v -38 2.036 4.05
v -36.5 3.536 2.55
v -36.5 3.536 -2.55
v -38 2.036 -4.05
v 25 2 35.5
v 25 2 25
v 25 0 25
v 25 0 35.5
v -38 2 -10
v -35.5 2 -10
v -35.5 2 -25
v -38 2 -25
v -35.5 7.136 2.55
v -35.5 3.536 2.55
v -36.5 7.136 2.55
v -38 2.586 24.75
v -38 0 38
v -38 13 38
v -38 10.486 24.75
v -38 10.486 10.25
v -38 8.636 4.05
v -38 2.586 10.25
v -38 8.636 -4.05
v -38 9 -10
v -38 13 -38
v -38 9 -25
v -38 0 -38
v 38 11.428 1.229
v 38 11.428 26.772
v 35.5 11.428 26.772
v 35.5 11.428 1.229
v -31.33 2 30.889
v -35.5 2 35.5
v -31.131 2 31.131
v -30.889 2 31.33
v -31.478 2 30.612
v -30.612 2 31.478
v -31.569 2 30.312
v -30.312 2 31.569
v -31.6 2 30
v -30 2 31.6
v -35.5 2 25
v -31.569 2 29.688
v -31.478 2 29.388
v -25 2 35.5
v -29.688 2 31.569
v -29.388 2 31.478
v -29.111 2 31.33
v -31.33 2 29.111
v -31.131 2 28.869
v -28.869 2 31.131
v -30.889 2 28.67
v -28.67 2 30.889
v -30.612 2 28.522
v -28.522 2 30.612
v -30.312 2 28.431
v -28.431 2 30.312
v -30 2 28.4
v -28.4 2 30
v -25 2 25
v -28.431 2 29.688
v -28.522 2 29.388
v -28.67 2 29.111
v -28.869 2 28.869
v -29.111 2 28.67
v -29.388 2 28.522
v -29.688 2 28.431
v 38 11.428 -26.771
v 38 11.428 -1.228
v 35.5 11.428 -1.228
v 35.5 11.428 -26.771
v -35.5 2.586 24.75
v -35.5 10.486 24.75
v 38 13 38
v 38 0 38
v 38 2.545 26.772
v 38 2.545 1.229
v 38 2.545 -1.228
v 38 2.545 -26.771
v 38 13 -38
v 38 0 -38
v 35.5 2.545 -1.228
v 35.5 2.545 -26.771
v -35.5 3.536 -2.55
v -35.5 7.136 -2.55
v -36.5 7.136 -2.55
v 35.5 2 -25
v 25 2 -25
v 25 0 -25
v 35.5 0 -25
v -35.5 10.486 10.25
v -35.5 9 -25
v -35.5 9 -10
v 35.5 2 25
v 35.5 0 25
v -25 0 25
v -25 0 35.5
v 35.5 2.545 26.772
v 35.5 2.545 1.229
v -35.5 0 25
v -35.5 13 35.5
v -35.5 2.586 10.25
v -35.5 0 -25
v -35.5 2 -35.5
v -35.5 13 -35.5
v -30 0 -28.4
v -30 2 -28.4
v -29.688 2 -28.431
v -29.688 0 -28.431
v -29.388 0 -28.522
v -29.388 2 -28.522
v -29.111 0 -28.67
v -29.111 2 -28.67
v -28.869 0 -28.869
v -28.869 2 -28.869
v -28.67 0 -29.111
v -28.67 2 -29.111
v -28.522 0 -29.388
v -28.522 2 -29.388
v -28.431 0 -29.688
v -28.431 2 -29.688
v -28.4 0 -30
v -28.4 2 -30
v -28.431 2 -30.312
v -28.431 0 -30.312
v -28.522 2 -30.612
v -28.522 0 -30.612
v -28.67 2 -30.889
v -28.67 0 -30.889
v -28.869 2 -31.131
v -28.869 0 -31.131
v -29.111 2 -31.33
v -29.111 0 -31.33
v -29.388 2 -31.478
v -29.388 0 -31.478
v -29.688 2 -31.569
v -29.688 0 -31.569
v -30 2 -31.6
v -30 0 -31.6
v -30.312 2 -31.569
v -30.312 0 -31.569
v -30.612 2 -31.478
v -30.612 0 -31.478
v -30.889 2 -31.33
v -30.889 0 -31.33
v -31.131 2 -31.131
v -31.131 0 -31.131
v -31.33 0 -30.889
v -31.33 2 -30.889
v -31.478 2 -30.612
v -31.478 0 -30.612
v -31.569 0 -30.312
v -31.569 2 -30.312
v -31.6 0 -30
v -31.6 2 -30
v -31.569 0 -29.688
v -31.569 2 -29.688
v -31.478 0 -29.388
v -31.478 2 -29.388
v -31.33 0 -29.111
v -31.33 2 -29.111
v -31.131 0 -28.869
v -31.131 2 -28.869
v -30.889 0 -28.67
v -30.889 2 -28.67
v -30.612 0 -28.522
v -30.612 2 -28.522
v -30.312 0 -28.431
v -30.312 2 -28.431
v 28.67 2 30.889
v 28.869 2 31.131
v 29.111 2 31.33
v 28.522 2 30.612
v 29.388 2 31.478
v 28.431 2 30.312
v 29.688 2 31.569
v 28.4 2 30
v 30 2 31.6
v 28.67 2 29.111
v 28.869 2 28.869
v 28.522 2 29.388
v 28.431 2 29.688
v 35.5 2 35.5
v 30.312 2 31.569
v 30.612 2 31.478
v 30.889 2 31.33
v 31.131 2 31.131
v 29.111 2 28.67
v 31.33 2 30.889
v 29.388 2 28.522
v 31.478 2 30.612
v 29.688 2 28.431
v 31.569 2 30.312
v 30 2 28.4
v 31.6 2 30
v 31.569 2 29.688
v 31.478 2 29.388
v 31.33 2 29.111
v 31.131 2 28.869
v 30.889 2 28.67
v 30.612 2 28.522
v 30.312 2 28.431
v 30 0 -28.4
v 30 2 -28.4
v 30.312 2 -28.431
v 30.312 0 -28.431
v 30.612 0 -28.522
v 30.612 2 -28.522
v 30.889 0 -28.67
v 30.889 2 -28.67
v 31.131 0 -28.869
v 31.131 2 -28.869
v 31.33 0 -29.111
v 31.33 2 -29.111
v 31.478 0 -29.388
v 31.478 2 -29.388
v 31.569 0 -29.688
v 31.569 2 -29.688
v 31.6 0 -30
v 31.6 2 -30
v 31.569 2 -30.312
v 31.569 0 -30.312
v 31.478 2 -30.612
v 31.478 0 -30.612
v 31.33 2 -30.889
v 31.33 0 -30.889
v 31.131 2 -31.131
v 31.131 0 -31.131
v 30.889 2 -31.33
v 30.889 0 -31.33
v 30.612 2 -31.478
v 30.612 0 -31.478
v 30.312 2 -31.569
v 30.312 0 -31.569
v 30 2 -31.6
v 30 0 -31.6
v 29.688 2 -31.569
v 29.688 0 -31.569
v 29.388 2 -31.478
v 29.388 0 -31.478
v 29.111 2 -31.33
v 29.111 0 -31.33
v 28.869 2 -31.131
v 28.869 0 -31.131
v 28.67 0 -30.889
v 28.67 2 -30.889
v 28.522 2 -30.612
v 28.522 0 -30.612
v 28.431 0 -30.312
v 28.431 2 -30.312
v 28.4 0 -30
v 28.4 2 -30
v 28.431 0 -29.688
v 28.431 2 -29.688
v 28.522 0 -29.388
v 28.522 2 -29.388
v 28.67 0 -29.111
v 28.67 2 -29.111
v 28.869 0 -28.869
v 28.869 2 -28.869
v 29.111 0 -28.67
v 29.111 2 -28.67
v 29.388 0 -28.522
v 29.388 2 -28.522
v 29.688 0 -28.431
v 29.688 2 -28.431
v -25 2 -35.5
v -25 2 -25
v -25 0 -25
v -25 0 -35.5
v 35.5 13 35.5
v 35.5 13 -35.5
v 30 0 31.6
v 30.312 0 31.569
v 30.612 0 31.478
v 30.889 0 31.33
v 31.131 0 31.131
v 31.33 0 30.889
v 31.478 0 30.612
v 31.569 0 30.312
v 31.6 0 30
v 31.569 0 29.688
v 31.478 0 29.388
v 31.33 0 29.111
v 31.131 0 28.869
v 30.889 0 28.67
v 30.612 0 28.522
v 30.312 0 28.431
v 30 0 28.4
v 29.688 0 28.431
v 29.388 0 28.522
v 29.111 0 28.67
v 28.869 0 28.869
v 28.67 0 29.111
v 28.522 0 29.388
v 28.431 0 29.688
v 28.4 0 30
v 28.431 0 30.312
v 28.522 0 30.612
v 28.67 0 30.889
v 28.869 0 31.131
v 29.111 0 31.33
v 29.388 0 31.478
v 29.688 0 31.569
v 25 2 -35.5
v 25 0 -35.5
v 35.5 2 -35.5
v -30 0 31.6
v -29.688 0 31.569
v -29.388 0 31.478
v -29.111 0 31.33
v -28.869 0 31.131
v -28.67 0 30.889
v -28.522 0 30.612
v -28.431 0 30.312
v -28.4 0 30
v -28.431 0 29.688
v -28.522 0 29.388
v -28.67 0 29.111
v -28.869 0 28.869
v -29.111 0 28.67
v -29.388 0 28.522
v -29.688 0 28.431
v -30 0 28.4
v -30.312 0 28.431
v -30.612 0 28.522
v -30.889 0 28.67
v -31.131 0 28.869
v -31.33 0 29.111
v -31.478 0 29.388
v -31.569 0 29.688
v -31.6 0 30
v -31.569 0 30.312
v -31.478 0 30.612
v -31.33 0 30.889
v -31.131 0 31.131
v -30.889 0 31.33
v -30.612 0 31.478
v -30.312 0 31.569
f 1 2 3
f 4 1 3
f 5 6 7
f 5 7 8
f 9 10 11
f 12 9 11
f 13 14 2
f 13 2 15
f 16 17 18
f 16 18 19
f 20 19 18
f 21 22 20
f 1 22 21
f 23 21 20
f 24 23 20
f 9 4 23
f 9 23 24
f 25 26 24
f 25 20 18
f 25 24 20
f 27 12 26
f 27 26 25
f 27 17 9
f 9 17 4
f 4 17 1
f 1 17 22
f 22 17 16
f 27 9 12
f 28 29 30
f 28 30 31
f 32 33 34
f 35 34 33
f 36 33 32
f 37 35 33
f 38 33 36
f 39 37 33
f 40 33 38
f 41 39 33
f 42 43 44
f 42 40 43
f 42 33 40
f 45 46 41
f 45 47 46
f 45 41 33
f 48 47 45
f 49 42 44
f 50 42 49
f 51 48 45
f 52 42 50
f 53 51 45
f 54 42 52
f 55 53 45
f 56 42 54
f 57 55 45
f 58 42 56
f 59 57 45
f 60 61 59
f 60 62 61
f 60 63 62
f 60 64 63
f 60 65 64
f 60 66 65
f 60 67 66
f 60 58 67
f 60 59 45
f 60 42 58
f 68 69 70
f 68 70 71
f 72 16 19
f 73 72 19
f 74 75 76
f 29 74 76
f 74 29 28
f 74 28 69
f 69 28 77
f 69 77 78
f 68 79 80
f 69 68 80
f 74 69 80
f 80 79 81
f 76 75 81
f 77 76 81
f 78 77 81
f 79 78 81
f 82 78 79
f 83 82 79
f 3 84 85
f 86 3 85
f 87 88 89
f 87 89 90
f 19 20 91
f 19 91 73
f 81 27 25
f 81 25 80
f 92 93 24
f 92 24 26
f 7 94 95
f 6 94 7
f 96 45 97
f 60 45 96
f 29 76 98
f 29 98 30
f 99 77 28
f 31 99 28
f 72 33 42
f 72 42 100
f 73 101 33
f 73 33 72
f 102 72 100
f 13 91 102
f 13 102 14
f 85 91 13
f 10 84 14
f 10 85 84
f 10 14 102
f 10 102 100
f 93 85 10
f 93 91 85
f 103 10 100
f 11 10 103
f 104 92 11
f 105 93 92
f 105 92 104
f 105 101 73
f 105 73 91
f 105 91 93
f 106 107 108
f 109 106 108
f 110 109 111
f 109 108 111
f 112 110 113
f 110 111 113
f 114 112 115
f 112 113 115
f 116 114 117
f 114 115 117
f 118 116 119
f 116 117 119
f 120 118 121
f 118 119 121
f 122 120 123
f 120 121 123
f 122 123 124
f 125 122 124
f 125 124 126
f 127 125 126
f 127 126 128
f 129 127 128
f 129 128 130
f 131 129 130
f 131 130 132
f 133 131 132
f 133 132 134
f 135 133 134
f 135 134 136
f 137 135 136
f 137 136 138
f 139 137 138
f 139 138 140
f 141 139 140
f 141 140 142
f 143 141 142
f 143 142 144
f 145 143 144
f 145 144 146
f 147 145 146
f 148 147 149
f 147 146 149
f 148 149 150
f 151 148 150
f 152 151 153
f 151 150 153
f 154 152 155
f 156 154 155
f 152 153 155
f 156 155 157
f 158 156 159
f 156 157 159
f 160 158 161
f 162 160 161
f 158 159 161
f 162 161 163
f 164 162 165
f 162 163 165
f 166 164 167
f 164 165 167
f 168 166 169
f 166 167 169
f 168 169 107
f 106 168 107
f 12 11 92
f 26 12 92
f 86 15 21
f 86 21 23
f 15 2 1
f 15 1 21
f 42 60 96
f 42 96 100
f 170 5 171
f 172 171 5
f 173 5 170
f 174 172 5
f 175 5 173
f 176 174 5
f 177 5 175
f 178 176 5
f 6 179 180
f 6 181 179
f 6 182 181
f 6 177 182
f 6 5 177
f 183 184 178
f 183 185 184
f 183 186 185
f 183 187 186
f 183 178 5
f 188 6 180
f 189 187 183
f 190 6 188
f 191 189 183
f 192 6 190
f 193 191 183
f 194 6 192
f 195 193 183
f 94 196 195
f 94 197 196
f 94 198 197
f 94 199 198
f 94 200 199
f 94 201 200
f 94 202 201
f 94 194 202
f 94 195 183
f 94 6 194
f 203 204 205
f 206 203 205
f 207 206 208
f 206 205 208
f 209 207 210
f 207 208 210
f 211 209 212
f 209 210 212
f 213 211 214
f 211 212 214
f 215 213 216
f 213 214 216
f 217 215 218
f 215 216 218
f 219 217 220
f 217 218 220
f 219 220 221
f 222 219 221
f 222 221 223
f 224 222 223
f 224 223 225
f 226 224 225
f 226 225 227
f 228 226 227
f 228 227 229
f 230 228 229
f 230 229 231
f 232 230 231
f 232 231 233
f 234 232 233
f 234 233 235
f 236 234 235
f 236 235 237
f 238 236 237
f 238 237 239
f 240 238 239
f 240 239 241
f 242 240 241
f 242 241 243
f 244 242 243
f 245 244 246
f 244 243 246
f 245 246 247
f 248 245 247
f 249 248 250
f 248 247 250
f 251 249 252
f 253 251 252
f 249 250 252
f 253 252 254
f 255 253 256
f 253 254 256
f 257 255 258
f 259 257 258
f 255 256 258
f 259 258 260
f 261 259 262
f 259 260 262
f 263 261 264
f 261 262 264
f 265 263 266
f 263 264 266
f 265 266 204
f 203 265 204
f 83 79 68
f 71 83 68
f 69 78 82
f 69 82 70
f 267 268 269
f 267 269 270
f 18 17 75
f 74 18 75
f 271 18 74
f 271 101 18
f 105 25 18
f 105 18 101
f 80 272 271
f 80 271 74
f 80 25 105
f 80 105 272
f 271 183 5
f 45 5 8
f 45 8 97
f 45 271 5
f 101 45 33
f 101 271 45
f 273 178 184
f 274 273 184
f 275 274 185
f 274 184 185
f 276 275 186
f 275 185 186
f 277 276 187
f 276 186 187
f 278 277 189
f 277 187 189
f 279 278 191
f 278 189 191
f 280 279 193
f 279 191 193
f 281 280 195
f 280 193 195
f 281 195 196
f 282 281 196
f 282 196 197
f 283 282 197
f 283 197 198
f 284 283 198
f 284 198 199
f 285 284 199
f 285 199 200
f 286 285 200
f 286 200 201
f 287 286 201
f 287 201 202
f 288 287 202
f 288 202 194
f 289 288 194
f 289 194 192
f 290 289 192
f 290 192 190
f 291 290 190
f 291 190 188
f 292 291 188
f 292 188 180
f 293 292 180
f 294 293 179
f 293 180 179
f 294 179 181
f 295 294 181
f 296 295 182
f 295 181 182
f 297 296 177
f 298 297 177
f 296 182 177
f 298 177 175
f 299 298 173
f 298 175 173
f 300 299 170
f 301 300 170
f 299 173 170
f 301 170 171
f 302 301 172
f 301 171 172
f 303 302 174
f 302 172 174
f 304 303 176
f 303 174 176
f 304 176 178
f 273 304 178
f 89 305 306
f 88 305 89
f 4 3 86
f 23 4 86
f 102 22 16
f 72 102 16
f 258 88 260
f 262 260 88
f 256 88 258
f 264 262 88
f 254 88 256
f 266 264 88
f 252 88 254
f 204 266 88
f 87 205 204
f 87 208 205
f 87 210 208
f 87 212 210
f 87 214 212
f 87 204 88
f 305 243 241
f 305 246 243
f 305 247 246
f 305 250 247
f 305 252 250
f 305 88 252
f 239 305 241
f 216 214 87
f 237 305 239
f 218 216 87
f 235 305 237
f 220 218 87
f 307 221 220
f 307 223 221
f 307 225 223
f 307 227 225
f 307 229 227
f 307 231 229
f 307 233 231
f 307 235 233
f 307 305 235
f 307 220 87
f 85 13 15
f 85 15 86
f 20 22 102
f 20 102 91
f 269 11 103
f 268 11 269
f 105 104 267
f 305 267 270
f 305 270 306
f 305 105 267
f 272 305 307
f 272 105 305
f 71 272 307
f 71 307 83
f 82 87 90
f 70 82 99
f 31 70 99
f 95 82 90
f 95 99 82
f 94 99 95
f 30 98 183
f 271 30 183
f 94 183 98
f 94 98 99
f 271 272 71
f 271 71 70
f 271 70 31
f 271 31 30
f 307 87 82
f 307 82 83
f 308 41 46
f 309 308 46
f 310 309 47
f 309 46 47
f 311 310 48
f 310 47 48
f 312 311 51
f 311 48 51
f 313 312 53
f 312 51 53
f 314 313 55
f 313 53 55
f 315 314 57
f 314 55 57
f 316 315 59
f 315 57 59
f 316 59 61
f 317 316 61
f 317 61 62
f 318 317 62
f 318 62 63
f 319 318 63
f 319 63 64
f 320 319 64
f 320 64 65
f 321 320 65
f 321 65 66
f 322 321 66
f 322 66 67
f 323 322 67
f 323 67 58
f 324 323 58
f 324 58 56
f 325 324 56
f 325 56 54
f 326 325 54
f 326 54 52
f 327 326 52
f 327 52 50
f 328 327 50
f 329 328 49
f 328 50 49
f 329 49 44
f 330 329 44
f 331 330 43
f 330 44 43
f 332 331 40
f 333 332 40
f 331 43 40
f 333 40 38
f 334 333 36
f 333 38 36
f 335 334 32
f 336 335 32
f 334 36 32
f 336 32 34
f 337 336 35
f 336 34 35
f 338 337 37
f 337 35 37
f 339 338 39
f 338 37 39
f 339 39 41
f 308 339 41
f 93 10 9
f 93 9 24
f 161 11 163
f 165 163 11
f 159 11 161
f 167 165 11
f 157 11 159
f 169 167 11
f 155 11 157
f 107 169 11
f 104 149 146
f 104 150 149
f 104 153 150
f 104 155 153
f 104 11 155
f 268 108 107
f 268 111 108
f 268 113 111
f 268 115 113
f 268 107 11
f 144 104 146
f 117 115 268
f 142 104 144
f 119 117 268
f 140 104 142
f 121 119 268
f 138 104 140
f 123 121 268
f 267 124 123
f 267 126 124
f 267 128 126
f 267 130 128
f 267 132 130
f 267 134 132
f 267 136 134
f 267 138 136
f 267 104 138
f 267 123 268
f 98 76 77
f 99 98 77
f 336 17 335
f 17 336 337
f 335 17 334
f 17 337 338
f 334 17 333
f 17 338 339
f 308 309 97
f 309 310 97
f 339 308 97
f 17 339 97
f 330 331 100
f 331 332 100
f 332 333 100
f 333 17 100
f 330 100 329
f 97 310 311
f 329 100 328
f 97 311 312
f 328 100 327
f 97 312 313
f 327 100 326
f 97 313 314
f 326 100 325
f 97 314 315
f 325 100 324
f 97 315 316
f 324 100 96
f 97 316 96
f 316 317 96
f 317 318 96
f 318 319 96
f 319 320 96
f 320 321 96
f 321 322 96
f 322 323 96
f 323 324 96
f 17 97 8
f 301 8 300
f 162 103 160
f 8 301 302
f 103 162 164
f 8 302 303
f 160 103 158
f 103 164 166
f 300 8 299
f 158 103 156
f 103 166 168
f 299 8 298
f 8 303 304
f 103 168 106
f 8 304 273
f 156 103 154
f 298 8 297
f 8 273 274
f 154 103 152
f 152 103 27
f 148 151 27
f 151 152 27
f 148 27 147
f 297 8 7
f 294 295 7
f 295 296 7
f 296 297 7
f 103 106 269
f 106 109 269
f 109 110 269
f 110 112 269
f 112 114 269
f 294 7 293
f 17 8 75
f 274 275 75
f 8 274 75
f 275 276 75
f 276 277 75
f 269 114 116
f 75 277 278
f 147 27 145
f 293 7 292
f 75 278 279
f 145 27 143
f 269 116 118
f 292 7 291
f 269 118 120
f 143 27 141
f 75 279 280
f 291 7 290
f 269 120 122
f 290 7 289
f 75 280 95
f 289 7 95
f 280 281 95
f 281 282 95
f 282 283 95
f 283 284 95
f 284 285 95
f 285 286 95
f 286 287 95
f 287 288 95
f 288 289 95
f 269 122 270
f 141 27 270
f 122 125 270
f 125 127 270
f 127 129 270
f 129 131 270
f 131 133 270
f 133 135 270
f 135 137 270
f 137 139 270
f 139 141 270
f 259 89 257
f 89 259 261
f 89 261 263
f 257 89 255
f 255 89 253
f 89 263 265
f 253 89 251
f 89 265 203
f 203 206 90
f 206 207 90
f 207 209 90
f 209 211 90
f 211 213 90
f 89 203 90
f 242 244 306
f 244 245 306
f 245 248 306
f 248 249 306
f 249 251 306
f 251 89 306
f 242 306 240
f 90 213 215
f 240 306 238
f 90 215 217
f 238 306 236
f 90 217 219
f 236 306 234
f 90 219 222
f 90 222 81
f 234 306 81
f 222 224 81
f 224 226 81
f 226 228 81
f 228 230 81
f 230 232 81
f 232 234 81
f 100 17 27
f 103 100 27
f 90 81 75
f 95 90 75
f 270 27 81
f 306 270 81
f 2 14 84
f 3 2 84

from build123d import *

# Parameters (mm, degrees)
SKETCH_1_W                  = 76
SKETCH_1_H                  = 76
EXTRUDE_1_DEPTH             = 13
SKETCH_2_W                  = 71
SKETCH_2_H                  = 71
CUT_EXTRUDE_1_DEPTH         = 11
SKETCH_3_R                  = 1.6
CUT_EXTRUDE_2_DEPTH         = 55.854352608
PATTERN_LINEAR_1_COUNT      = 2
PATTERN_LINEAR_1_PITCH      = 60
PATTERN_LINEAR_1_COUNT_DIR2 = 2
PATTERN_LINEAR_1_PITCH_DIR2 = 60
CUT_EXTRUDE_3_DEPTH         = 55.854352608
CUT_EXTRUDE_5_REACH         = 87.959
SKETCH_5_W                  = 14.5
SKETCH_5_H                  = 7.9
CUT_EXTRUDE_6_REACH         = 87.959
SKETCH_7_W                  = 25.542842713
SKETCH_7_H                  = 8.882842713
CUT_EXTRUDE_7_REACH         = 85.757
SKETCH_8_W                  = 5.1
SKETCH_8_H                  = 3.6
CUT_EXTRUDE_8_REACH         = 85.757
SKETCH_9_W                  = 15
SKETCH_9_H                  = 7
CHAMFER_1_SIZE              = 1.5


with BuildPart() as part:
    # 草图1 → 凸台-拉伸1 (new body)
    with BuildSketch(Plane(origin=(0, 0, 0), x_dir=(1, 0, 0), z_dir=(0, 1, 0))):
        Rectangle(SKETCH_1_W, SKETCH_1_H)
    extrude(amount=EXTRUDE_1_DEPTH)

    # 草图2 → 切除-拉伸1 (cut)
    with BuildSketch(Plane(origin=(0, 13, 0), x_dir=(1, 0, 0), z_dir=(0, 1, 0))):
        Rectangle(SKETCH_2_W, SKETCH_2_H)
    extrude(amount=-CUT_EXTRUDE_1_DEPTH, mode=Mode.SUBTRACT)

    # 草图3 → 切除-拉伸2 (cut, through all)
    with BuildSketch(Plane(origin=(0, 2, 0), x_dir=(1, 0, 0), z_dir=(0, 1, 0))):
        with Locations(Location((-30, 30, 0), (0, 0, 270))):
            Circle(SKETCH_3_R)
    cut_extrude_2 = extrude(amount=-CUT_EXTRUDE_2_DEPTH, mode=Mode.SUBTRACT)

    # 阵列(线性)1: Cut-Extrude 2 2 × 2
    with Locations(*[(i * PATTERN_LINEAR_1_PITCH, 0, j * PATTERN_LINEAR_1_PITCH_DIR2) for i in range(PATTERN_LINEAR_1_COUNT) for j in range(PATTERN_LINEAR_1_COUNT_DIR2) if (i, j) != (0, 0)]):
        add(cut_extrude_2, mode=Mode.SUBTRACT)

    # 草图4 → 切除-拉伸3 (cut, through all)
    with BuildSketch(Plane(origin=(0, 2, 0), x_dir=(1, 0, 0), z_dir=(0, 1, 0))):
        Polygon((35.5, -25), (25, -25), (25, -35.5), (-25, -35.5), (-25, -25), (-35.5, -25), (-35.5, 25), (-25, 25), (-25, 35.5), (25, 35.5), (25, 25), (35.5, 25), align=None)
    extrude(amount=-CUT_EXTRUDE_3_DEPTH, mode=Mode.SUBTRACT)

    # 草图5 → 切除-拉伸5 (cut, up to next)
    with BuildSketch(Plane.ZY.offset(38), mode=Mode.PRIVATE) as cut_extrude_5_sk1:
        with Locations((17.50009652, 6.536156877)):
            Rectangle(SKETCH_5_W, SKETCH_5_H)
    cut_extrude_5_tool1 = extrude(cut_extrude_5_sk1.sketch, amount=-CUT_EXTRUDE_5_REACH, mode=Mode.PRIVATE) & part.part
    add(cut_extrude_5_tool1.solids().sort_by_distance((-38, 6.536157, 17.500097))[0], mode=Mode.SUBTRACT)

    # 草图7 → 切除-拉伸6 (cut, up to next)
    with BuildSketch(Plane(origin=(38, 0, 0), x_dir=(0, 0, -1), z_dir=(1, 0, 0)), mode=Mode.PRIVATE) as cut_extrude_6_sk1:
        with Locations((13.99984252, 6.98615625)):
            Rectangle(SKETCH_7_W, SKETCH_7_H)
    cut_extrude_6_tool1 = extrude(cut_extrude_6_sk1.sketch, amount=-CUT_EXTRUDE_6_REACH, mode=Mode.PRIVATE) & part.part
    # 草图7 → 切除-拉伸6 (cut, up to next)
    with BuildSketch(Plane(origin=(38, 0, 0), x_dir=(0, 0, -1), z_dir=(1, 0, 0)), mode=Mode.PRIVATE) as cut_extrude_6_sk2:
        with Locations((-14.000215901, 6.98615625)):
            Rectangle(SKETCH_7_W, SKETCH_7_H)
    cut_extrude_6_tool2 = extrude(cut_extrude_6_sk2.sketch, amount=-CUT_EXTRUDE_6_REACH, mode=Mode.PRIVATE) & part.part
    add(cut_extrude_6_tool1.solids().sort_by_distance((38, 6.986156, -13.999843))[0], mode=Mode.SUBTRACT)
    add(cut_extrude_6_tool2.solids().sort_by_distance((38, 6.986156, 14.000216))[0], mode=Mode.SUBTRACT)

    # 草图8 → 切除-拉伸7 (cut, up to next)
    with BuildSketch(Plane(origin=(-35.5, 0, 0), x_dir=(0, 0, -1), z_dir=(1, 0, 0)), mode=Mode.PRIVATE) as cut_extrude_7_sk1:
        with Locations((-3.556e-05, 5.336156974)):
            Rectangle(SKETCH_8_W, SKETCH_8_H)
    cut_extrude_7_tool1 = extrude(cut_extrude_7_sk1.sketch, amount=-CUT_EXTRUDE_7_REACH, mode=Mode.PRIVATE) & part.part
    add(cut_extrude_7_tool1.solids().sort_by_distance((-35.5, 5.336157, 3.6e-05))[0], mode=Mode.SUBTRACT)

    # 草图9 → 切除-拉伸8 (cut, up to next)
    with BuildSketch(Plane(origin=(-35.5, 0, 0), x_dir=(0, 0, -1), z_dir=(1, 0, 0)), mode=Mode.PRIVATE) as cut_extrude_8_sk1:
        with Locations((17.5, 5.5)):
            Rectangle(SKETCH_9_W, SKETCH_9_H)
    cut_extrude_8_tool1 = extrude(cut_extrude_8_sk1.sketch, amount=-CUT_EXTRUDE_8_REACH, mode=Mode.PRIVATE) & part.part
    add(cut_extrude_8_tool1.solids().sort_by_distance((-35.5, 5.5, -17.5))[0], mode=Mode.SUBTRACT)

    # 倒角1
    chamfer_1_edges = [part.edges().sort_by_distance(p)[0] for p in [
        (-38, 5.336156974, -2.54996444),
        (-38, 3.536156974, 3.556e-05),
        (-38, 5.336156974, 2.55003556),
        (-38, 7.136156974, 3.556e-05),
    ]]
    chamfer(chamfer_1_edges, length=CHAMFER_1_SIZE)


solid = part.part
